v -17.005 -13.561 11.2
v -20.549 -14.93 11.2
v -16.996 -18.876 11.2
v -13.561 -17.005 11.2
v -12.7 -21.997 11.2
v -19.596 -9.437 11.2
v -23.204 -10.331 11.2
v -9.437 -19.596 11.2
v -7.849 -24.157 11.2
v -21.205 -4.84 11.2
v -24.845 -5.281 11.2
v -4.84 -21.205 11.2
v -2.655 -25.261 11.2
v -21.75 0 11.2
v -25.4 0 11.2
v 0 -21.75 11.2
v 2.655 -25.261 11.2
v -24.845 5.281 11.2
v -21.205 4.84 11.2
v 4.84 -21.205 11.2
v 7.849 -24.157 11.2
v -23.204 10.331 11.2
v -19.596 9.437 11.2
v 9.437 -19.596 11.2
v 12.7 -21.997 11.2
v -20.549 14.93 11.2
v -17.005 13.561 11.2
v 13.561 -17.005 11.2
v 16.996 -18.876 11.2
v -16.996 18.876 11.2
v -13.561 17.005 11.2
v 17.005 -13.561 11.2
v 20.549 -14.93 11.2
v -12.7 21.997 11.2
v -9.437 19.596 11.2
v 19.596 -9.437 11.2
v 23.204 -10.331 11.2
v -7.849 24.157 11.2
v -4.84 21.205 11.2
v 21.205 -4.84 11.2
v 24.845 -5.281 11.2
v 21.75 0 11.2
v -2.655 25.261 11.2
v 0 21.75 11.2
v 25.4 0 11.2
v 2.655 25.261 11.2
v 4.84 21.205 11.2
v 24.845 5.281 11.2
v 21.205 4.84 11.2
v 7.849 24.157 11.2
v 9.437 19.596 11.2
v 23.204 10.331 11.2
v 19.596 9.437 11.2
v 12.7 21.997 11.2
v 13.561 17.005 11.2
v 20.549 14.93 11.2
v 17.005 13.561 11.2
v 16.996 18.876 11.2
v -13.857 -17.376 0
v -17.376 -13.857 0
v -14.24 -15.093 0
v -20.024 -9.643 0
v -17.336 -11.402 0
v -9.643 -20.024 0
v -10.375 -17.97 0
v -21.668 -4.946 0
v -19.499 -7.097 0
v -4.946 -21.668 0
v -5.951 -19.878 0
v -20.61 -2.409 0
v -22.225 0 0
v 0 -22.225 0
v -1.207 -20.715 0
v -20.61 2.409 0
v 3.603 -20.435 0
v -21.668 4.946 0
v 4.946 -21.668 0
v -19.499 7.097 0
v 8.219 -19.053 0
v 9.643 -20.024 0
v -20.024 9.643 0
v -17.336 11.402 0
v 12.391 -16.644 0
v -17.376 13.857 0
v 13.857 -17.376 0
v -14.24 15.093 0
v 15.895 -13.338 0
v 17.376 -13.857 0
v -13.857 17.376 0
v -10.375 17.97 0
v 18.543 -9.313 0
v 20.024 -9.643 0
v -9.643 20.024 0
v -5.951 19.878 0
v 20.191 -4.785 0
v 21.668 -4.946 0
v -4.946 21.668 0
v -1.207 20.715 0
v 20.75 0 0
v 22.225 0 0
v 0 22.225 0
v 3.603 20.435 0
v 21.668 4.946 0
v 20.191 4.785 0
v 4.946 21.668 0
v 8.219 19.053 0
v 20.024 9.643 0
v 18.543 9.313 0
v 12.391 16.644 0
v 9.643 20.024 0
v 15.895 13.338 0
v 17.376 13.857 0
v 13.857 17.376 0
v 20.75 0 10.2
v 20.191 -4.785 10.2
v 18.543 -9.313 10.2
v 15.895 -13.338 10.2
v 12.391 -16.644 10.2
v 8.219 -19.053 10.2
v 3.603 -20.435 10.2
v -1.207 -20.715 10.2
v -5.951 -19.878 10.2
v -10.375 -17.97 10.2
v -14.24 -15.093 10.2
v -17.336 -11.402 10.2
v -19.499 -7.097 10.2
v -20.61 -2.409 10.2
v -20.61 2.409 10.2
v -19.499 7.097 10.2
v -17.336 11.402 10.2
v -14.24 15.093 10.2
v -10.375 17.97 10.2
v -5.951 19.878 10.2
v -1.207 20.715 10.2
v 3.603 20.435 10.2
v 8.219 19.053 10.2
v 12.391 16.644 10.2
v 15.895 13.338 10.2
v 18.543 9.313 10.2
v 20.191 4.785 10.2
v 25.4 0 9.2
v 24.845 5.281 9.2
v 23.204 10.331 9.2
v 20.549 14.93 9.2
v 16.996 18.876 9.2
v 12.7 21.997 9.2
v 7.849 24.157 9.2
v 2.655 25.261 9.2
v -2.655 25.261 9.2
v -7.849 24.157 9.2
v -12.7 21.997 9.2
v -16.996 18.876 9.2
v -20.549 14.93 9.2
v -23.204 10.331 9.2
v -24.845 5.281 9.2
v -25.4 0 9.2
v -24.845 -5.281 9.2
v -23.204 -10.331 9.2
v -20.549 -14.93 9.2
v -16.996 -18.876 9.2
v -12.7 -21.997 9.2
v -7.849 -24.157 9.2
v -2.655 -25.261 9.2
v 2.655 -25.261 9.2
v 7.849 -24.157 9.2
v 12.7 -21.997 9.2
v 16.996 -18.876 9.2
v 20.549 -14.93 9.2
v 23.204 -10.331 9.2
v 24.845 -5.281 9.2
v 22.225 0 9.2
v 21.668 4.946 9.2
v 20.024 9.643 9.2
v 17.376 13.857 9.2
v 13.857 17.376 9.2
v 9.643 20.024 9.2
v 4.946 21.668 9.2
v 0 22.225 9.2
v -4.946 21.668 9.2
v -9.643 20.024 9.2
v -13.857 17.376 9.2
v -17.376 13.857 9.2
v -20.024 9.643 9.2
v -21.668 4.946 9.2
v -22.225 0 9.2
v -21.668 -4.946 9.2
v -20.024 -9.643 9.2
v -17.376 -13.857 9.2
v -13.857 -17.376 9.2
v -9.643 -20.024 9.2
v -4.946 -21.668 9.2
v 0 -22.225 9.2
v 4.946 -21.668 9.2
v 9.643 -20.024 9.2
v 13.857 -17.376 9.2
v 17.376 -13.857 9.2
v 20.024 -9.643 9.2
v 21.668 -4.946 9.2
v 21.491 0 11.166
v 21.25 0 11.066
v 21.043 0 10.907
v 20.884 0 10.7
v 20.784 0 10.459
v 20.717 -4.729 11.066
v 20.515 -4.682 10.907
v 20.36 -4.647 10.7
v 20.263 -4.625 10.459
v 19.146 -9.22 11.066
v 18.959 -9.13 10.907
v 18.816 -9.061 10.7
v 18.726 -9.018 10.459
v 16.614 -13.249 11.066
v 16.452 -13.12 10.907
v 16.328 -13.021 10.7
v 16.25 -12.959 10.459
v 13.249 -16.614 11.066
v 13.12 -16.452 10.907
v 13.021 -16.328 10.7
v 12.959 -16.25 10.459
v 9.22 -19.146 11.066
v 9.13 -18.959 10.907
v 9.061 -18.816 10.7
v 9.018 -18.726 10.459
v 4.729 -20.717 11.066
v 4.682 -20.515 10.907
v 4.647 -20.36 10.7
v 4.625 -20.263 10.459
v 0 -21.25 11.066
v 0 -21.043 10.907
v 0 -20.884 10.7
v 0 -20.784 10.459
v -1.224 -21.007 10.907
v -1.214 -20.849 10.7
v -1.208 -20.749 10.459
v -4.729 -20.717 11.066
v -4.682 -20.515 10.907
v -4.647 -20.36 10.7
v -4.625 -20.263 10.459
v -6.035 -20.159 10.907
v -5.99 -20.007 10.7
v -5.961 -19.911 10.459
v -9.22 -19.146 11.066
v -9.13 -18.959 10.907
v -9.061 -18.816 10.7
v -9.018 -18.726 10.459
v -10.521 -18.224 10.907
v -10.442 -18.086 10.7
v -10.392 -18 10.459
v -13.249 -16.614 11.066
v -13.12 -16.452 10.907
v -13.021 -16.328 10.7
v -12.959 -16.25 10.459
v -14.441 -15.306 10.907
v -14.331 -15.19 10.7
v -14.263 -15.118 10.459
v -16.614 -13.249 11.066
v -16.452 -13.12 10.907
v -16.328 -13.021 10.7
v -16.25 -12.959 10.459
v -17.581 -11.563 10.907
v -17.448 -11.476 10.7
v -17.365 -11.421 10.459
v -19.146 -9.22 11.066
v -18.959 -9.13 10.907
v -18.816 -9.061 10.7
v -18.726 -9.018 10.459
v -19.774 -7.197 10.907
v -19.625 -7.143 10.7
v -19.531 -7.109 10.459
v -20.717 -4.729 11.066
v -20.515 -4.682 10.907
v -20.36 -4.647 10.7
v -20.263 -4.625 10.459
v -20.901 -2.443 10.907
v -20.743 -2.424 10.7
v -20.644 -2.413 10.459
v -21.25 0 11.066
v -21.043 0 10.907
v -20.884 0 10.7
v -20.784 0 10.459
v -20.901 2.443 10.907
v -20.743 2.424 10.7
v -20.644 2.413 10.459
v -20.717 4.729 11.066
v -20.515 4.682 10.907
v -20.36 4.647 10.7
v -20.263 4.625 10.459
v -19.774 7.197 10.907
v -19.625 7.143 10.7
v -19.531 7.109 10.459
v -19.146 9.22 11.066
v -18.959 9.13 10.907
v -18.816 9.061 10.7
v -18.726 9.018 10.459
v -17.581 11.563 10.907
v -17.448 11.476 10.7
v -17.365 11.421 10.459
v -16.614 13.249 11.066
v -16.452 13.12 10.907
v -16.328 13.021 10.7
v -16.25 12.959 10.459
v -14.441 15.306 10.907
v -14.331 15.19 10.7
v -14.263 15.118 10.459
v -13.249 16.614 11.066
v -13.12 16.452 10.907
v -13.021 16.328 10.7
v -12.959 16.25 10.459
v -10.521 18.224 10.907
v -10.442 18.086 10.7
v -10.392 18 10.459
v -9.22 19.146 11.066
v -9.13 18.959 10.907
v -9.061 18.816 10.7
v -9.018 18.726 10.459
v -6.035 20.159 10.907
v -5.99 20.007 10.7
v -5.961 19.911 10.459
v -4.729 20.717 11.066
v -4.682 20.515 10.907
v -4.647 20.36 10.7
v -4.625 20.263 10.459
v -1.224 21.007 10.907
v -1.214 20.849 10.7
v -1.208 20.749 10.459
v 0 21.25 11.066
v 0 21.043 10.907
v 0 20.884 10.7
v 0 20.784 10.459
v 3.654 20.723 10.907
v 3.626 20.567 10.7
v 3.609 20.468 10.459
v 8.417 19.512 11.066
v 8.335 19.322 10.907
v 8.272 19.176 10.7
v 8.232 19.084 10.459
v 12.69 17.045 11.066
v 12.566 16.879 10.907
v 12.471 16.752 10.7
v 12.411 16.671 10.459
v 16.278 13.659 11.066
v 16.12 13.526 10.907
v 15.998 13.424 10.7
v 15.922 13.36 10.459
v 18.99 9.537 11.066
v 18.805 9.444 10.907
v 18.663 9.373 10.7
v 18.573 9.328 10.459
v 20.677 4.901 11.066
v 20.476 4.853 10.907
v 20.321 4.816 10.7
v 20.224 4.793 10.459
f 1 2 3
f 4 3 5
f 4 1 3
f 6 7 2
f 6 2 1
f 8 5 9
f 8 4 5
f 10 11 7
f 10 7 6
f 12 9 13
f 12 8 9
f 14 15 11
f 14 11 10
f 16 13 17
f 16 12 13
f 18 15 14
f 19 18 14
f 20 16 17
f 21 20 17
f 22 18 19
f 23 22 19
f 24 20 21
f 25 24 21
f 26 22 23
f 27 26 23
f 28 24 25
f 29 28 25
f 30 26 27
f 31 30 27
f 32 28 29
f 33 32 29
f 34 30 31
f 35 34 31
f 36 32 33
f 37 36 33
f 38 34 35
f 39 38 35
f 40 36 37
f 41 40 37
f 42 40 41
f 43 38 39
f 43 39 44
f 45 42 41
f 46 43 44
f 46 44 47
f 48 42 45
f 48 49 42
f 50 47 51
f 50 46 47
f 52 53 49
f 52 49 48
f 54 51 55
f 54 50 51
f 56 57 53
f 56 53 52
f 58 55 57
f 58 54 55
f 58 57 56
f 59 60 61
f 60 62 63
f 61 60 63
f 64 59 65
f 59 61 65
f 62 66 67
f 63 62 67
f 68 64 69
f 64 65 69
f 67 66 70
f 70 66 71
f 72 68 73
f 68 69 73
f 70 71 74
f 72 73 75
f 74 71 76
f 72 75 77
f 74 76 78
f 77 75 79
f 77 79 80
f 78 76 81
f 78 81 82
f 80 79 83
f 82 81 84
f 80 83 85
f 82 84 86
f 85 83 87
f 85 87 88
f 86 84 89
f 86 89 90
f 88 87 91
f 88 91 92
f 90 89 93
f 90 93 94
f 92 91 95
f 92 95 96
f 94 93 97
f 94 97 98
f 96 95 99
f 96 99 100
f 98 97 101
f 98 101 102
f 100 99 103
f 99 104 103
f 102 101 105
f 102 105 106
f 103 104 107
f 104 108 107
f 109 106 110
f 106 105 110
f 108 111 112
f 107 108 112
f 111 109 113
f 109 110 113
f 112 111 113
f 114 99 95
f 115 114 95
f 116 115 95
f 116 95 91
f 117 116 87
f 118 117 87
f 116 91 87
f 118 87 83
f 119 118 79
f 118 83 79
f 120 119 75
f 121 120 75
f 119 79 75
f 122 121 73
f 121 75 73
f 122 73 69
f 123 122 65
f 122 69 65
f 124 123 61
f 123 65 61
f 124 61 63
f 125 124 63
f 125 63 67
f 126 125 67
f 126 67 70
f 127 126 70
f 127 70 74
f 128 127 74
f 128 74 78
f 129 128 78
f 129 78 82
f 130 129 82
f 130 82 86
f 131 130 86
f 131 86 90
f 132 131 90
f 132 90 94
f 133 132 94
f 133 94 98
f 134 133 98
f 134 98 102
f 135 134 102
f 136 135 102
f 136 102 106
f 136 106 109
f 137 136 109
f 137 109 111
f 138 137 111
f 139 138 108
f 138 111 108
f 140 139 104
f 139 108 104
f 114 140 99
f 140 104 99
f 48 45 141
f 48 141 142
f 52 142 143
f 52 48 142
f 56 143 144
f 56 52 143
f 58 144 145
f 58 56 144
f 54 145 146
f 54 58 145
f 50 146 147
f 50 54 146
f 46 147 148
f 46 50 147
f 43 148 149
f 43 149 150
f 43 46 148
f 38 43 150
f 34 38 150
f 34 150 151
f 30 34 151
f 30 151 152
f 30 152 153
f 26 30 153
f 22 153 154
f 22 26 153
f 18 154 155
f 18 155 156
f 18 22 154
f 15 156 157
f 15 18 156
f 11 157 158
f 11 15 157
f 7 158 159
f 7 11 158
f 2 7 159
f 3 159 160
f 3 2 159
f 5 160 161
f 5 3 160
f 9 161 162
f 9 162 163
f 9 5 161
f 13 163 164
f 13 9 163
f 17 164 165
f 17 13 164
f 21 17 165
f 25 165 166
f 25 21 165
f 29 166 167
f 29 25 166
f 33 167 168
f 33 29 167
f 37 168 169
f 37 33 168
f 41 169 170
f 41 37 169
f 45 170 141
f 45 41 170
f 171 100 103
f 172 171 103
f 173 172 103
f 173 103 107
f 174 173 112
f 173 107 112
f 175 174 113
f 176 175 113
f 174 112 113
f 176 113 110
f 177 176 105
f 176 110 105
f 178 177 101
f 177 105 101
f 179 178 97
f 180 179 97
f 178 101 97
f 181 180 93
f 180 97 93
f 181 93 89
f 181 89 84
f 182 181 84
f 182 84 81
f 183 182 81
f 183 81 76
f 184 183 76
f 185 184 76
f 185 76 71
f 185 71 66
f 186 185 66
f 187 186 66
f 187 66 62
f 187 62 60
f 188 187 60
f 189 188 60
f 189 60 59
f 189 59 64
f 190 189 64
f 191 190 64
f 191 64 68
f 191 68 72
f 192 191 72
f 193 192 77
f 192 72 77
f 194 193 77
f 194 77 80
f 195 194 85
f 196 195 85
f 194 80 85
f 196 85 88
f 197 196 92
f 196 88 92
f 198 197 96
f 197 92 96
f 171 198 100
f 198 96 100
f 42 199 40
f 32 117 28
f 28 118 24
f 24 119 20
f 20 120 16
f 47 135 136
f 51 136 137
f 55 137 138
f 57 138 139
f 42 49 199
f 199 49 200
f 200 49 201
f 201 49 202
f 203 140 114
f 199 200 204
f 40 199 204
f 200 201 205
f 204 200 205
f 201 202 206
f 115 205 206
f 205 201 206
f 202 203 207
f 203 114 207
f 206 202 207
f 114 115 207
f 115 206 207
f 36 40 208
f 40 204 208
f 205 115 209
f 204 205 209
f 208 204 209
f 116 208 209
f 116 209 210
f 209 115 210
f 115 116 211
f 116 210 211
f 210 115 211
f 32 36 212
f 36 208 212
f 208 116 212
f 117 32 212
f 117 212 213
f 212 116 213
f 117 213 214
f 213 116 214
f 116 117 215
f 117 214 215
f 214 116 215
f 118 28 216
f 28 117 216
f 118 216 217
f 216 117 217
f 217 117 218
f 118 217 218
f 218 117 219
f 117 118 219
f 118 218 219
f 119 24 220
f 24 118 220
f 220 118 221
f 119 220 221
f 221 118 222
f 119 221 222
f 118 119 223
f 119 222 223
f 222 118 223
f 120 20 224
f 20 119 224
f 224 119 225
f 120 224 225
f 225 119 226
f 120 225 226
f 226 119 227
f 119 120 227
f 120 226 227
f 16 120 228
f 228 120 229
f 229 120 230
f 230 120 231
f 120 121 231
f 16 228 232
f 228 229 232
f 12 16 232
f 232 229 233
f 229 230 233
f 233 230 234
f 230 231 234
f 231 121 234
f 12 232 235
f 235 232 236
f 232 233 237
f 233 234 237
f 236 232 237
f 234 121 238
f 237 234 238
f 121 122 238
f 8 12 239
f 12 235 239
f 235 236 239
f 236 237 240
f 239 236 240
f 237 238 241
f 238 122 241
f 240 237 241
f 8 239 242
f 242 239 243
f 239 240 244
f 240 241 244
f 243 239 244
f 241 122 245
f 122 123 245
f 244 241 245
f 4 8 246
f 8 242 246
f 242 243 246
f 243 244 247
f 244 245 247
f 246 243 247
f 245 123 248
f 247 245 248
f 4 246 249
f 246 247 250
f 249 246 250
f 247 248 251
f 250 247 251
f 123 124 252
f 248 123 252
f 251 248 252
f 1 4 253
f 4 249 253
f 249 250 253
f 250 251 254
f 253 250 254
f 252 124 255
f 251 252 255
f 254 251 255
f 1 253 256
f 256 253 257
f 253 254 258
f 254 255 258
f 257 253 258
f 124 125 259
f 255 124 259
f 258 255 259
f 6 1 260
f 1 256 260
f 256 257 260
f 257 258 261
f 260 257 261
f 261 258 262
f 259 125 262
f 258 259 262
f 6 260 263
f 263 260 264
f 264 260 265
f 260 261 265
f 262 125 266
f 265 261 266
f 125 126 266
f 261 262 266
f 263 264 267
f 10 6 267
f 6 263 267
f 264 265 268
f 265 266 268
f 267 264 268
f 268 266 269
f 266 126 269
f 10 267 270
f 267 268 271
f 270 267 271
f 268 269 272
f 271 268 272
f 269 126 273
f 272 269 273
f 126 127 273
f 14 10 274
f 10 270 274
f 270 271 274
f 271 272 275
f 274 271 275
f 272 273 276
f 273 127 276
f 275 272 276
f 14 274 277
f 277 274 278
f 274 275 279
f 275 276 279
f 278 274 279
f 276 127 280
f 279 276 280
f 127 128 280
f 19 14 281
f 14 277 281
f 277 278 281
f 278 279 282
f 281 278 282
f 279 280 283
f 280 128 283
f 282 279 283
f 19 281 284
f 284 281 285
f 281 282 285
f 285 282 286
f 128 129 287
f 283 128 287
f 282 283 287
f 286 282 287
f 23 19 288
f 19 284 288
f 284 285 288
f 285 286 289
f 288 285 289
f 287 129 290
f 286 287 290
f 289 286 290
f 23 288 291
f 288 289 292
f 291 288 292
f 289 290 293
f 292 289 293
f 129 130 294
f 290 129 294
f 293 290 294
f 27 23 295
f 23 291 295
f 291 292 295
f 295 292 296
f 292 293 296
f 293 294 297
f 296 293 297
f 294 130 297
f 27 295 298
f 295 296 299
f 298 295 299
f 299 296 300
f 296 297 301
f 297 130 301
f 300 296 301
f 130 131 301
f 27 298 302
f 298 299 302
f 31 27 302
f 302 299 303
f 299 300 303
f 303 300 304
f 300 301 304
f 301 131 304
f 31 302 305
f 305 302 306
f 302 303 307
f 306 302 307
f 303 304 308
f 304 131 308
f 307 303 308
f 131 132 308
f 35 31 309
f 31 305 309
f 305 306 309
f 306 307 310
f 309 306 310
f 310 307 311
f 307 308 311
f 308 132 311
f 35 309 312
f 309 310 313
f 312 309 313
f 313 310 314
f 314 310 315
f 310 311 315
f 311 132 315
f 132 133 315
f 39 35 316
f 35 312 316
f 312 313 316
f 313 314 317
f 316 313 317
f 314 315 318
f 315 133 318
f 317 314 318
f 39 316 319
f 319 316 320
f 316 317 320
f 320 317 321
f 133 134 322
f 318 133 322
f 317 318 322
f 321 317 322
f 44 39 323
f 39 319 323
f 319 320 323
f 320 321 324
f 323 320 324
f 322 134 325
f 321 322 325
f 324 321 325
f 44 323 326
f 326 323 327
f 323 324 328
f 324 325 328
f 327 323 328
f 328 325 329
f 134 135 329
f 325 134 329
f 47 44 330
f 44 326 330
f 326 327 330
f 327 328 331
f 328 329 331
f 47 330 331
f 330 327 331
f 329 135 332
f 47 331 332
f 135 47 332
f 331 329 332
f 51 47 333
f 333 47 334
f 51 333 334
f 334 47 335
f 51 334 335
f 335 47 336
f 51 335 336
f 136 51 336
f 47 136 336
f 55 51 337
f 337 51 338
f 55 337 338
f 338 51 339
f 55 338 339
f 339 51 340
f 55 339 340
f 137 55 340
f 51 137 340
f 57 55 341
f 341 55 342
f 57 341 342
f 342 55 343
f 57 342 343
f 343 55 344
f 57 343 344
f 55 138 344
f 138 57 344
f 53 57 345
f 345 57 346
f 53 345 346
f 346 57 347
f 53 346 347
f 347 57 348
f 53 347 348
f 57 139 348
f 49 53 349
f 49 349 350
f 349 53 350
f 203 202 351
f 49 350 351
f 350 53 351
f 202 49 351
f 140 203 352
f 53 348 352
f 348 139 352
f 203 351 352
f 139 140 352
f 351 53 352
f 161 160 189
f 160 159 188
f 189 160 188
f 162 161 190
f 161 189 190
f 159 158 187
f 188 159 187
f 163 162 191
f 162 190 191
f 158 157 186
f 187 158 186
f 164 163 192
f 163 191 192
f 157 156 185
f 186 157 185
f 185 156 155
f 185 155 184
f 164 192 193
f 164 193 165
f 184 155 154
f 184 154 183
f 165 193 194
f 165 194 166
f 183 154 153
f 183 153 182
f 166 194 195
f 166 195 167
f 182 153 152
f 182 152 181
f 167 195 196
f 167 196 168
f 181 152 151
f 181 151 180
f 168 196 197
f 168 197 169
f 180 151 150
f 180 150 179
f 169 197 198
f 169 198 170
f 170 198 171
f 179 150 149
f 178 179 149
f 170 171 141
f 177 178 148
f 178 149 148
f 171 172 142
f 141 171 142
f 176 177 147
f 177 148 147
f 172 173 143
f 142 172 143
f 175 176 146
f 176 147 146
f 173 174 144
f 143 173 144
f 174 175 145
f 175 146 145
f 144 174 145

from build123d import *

# Parameters (mm, degrees)
F0_R     = 22.225
F1_DEPTH = 11.2
F2_R     = 25.4
F2_R_2   = 22.225
F3_DEPTH = 2
F4_R     = 20.75
F5_DEPTH = 25
F6_R     = 1


with BuildPart() as f1:
    # F0 (on Top) → F1 (new body)
    with BuildSketch(Plane.XY):
        Circle(F0_R)
    extrude(amount=F1_DEPTH)

    # F2 (on face) → F3 (join)
    with BuildSketch(Plane.XY.offset(11.2)):
        Circle(F2_R)
        Circle(F2_R_2, mode=Mode.SUBTRACT)
    extrude(amount=-F3_DEPTH)

    # F4 (on face) → F5 (cut)
    with BuildSketch(Plane(origin=(0, 0, 0), x_dir=(1, 0, 0), z_dir=(0, 0, -1))):
        Circle(F4_R)
    extrude(amount=-F5_DEPTH, mode=Mode.SUBTRACT)

    # F6
    f6_edges = [f1.edges().sort_by_distance(p)[0] for p in [
        (-20.75, 0, 11.2),
    ]]
    fillet(f6_edges, radius=F6_R)


solid = f1.part
